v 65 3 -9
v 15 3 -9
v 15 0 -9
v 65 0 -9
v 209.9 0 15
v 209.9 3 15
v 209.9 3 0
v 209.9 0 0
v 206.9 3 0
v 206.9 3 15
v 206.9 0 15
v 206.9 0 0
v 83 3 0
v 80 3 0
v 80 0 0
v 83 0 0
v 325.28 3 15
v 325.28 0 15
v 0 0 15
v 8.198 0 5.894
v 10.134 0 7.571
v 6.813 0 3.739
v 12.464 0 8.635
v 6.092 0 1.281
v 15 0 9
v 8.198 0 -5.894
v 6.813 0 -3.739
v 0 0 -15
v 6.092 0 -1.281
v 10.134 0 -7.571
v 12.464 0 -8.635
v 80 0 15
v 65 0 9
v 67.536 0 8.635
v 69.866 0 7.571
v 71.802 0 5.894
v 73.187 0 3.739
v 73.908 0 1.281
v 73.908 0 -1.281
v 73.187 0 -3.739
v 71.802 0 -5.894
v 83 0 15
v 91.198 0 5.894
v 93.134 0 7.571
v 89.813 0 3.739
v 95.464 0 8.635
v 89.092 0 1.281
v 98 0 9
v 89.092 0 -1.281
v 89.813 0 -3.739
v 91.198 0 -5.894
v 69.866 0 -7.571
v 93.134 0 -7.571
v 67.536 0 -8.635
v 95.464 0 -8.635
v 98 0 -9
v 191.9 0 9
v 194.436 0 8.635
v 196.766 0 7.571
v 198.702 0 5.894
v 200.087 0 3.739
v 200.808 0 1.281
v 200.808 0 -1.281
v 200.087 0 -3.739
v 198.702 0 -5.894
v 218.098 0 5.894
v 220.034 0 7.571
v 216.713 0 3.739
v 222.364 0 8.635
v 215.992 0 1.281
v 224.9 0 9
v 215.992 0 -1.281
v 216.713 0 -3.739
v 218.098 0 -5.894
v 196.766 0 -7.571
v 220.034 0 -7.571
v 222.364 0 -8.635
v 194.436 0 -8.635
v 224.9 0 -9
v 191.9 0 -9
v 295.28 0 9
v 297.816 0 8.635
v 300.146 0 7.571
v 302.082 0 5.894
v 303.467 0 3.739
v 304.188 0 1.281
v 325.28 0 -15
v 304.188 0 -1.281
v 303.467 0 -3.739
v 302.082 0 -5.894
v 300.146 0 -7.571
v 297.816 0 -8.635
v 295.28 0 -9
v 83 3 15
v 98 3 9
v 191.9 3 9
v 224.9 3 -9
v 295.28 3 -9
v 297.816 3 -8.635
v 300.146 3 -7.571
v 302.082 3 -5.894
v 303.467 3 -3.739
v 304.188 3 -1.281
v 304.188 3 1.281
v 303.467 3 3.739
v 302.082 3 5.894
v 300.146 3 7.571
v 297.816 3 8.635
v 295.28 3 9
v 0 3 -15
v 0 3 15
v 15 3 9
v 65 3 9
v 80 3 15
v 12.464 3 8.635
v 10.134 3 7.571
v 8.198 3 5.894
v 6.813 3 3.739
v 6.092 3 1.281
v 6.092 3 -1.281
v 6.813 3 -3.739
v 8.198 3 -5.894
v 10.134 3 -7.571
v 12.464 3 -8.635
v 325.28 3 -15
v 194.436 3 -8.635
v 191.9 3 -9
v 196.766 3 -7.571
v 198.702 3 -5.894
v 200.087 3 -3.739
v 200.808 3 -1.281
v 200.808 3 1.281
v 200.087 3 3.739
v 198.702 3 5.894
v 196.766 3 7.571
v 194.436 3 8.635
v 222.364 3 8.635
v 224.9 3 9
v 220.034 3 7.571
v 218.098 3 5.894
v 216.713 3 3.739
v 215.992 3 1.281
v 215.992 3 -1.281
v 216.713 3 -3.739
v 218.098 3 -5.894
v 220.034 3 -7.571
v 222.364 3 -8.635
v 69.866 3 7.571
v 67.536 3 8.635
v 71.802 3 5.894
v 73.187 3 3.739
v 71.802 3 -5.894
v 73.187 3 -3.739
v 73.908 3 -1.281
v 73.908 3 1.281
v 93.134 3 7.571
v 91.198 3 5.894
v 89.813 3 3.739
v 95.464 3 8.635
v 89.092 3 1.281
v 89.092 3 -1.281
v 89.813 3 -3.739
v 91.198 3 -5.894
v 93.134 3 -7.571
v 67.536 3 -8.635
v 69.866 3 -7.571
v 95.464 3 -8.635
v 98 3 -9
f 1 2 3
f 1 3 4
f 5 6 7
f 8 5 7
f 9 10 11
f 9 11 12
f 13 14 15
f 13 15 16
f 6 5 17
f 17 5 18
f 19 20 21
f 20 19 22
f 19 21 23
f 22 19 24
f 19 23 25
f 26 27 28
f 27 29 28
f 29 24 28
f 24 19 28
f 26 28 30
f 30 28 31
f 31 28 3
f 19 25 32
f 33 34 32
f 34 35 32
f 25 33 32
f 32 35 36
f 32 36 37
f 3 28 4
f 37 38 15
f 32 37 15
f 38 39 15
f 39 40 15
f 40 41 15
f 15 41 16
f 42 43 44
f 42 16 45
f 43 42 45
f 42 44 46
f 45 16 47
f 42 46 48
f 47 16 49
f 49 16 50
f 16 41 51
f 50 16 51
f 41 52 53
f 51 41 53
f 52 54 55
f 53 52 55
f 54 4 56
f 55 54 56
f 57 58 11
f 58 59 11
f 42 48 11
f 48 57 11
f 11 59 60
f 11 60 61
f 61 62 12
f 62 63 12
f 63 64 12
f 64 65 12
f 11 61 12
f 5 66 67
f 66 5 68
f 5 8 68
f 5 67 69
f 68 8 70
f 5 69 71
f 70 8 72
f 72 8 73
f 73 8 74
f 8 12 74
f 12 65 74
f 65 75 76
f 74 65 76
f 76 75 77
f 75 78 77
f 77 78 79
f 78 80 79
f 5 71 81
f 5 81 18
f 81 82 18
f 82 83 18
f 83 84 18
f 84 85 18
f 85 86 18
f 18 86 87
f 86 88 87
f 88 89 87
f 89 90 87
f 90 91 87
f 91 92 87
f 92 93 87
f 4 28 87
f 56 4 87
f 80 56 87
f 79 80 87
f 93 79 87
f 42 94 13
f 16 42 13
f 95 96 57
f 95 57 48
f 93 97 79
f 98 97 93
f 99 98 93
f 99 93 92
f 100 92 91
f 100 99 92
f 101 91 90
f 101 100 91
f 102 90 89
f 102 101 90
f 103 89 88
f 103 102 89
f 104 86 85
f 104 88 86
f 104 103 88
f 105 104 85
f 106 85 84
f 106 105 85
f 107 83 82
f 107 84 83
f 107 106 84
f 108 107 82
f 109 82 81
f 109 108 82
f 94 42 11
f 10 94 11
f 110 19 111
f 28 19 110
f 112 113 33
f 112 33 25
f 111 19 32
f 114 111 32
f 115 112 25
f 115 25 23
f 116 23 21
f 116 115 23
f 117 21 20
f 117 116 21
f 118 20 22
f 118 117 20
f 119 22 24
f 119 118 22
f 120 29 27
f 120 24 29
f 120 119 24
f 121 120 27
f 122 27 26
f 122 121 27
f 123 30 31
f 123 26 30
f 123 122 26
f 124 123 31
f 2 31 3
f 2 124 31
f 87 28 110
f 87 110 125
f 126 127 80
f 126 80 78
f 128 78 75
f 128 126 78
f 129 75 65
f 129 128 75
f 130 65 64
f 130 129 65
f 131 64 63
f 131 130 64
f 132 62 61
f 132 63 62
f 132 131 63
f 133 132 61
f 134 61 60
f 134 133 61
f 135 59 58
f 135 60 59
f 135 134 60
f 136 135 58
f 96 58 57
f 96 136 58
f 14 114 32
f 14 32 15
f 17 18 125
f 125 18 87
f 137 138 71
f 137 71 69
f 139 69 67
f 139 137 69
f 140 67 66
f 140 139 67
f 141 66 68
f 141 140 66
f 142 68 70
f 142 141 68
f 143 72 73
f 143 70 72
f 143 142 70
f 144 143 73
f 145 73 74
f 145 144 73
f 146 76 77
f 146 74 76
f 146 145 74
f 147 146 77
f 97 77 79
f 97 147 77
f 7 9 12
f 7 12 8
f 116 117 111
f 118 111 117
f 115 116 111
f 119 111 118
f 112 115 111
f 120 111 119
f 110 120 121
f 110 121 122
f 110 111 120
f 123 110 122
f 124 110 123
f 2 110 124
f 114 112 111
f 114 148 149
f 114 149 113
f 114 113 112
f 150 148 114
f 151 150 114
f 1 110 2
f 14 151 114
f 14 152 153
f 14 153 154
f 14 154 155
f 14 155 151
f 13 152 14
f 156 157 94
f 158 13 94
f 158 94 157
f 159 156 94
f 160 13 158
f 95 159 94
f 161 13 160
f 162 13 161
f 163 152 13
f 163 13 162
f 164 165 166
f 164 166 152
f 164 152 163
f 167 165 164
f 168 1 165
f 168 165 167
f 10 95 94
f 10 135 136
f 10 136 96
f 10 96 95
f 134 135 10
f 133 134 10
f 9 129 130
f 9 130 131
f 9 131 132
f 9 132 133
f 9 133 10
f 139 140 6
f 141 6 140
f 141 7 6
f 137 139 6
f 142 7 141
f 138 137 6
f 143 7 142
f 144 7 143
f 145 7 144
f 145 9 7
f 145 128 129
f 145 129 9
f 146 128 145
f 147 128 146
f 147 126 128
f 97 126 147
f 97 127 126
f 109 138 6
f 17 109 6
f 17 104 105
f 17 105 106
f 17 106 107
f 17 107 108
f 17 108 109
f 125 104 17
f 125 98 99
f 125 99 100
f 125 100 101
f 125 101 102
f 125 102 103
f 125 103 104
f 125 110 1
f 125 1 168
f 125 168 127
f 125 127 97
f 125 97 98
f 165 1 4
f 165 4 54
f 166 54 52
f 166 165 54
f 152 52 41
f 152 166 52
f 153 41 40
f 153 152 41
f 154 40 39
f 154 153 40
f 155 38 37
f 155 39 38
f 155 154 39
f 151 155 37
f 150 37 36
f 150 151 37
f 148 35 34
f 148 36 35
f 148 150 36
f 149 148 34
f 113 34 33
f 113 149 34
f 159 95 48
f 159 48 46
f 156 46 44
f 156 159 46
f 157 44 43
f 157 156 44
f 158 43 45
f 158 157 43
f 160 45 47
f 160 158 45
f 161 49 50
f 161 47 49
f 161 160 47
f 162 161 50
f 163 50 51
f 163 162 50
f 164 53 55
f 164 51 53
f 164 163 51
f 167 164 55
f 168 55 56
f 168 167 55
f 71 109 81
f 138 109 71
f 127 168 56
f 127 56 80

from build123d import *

# Parameters (mm, degrees)
SKETCH1_W               = 325.28
SKETCH1_H               = 30
BOSS_EXTRUDE1_DEPTH     = 3
SKETCH2_W               = 3
SKETCH2_H               = 15
CUT_EXTRUDE1_DEPTH      = 1
CUT_EXTRUDE1_DEPTH_BACK = 4
CUT_EXTRUDE3_DEPTH      = 4


with BuildPart() as part:
    # Sketch1 → Boss-Extrude1 (new body)
    with BuildSketch(Plane(origin=(0, 0, 0), x_dir=(1, 0, 0), z_dir=(0, 1, 0))):
        with Locations((162.64, 0)):
            Rectangle(SKETCH1_W, SKETCH1_H)
    extrude(amount=BOSS_EXTRUDE1_DEPTH)

    # Sketch2 → Cut-Extrude1 (cut, two sides)
    with BuildSketch(Plane(origin=(0, 3, 0), x_dir=(1, 0, 0), z_dir=(0, 1, 0))) as cut_extrude1_sk:
        with Locations((81.5, -7.5)):
            Rectangle(SKETCH2_W, SKETCH2_H)
        with Locations((208.4, -7.5)):
            Rectangle(SKETCH2_W, SKETCH2_H)
    extrude(amount=CUT_EXTRUDE1_DEPTH, mode=Mode.SUBTRACT)
    extrude(cut_extrude1_sk.sketch, amount=-CUT_EXTRUDE1_DEPTH_BACK, mode=Mode.SUBTRACT)

    # Sketch4 → Cut-Extrude3 (cut, through all)
    with BuildSketch(Plane(origin=(0, 3, 0), x_dir=(1, 0, 0), z_dir=(0, 1, 0))):
        with BuildLine():
            Line((15, 9), (65, 9))
            ThreePointArc((65, 9), (74, 0), (65, -9))
            Line((65, -9), (15, -9))
            ThreePointArc((15, -9), (6, 0), (15, 9))
        make_face()
        with BuildLine():
            Line((98, 9), (191.9, 9))
            ThreePointArc((191.9, 9), (200.9, 0), (191.9, -9))
            Line((191.9, -9), (98, -9))
            ThreePointArc((98, -9), (89, 0), (98, 9))
        make_face()
        with BuildLine():
            Line((224.9, 9), (295.28, 9))
            ThreePointArc((295.28, 9), (304.28, 0), (295.28, -9))
            Line((295.28, -9), (224.9, -9))
            ThreePointArc((224.9, -9), (215.9, 0), (224.9, 9))
        make_face()
    extrude(amount=-CUT_EXTRUDE3_DEPTH, mode=Mode.SUBTRACT)


solid = part.part
